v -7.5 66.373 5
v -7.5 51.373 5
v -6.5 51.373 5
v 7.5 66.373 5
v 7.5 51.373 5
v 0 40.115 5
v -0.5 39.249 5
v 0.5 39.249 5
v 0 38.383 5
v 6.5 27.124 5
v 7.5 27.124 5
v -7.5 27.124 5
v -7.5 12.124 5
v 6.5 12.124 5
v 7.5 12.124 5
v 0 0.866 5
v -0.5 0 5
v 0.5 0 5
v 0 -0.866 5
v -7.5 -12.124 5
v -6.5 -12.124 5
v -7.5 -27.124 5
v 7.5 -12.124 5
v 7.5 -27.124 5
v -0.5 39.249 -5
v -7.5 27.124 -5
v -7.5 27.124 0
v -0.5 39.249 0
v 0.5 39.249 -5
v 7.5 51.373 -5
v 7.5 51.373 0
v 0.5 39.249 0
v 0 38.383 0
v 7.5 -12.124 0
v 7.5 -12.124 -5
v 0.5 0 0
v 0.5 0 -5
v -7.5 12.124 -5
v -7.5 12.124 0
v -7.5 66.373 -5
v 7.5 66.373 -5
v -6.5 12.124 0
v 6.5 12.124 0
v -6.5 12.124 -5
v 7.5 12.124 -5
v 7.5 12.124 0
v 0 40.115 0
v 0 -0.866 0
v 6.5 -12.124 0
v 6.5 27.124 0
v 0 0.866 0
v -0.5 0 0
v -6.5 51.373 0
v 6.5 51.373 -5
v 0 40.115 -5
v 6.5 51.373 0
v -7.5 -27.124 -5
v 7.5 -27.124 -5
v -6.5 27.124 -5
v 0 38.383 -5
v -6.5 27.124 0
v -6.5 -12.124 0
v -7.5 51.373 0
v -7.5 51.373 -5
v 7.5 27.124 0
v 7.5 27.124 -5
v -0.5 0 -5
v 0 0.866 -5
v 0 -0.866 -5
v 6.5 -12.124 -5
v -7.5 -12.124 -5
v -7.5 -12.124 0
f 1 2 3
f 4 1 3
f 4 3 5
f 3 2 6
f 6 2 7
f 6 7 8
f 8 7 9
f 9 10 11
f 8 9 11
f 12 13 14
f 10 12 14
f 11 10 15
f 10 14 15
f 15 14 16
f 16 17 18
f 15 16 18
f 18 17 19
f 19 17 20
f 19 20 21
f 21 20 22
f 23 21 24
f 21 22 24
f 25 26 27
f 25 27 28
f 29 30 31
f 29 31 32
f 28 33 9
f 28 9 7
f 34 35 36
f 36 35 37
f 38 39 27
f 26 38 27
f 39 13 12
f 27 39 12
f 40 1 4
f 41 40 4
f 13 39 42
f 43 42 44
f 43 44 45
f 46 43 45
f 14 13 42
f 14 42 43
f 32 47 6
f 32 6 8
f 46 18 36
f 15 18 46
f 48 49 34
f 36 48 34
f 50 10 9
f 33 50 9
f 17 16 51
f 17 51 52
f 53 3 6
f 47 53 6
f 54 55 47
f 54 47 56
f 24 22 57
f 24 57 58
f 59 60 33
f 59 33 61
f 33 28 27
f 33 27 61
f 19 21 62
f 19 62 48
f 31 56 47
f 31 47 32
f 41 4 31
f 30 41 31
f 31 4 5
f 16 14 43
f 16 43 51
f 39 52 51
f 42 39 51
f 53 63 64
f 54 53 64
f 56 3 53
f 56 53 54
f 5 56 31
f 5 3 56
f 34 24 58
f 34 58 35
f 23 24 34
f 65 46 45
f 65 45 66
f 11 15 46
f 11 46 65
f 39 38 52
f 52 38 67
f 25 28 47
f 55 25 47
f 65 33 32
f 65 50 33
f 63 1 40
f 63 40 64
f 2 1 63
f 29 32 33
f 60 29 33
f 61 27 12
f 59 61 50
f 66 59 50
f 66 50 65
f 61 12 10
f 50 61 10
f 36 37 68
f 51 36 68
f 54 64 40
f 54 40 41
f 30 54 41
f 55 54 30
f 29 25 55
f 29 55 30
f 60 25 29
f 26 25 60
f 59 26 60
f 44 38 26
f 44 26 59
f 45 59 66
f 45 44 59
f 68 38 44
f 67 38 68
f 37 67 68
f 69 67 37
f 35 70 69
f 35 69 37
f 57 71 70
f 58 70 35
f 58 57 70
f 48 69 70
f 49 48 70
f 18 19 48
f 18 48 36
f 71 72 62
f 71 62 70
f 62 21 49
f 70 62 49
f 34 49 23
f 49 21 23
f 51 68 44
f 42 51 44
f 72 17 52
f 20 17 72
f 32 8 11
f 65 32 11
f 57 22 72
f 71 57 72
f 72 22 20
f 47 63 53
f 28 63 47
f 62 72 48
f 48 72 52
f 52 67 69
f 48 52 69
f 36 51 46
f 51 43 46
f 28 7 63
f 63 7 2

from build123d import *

# Parameters (mm, degrees)
SKETCH1_W           = 15
SKETCH1_H           = 15
BOSS_EXTRUDE1_DEPTH = 5
BOSS_EXTRUDE2_START = 5
BOSS_EXTRUDE2_DEPTH = 5
BOSS_EXTRUDE3_START = -5
BOSS_EXTRUDE3_DEPTH = 5
SKETCH1_5_W         = 15
SKETCH1_5_H         = 15
BOSS_EXTRUDE4_DEPTH = 5


with BuildPart() as part:
    # Sketch1 → Boss-Extrude1 (new, symmetric)
    with BuildSketch(Plane.XY):
        with Locations((0, -19.624355653)):
            Rectangle(SKETCH1_W, SKETCH1_H)
    boss_extrude1 = extrude(amount=BOSS_EXTRUDE1_DEPTH, both=True)

    # Sketch1<3> → Boss-Extrude2 (add)
    with BuildSketch(Plane.XY.offset(BOSS_EXTRUDE2_START)):
        Polygon((-6.5, -12.124355653), (0, -0.866025404), (-0.5, 0), (-7.5, -12.124355653), align=None)
        Polygon((0.5, 0), (7.5, 12.124355653), (6.5, 12.124355653), (0, 0.866025404), align=None)
        Polygon((0, -0.866025404), (0.5, 0), (0, 0.866025404), (-0.5, 0), align=None)
    boss_extrude2 = extrude(amount=-BOSS_EXTRUDE2_DEPTH)

    # Sketch1<4> → Boss-Extrude3 (add)
    with BuildSketch(Plane.XY.offset(BOSS_EXTRUDE3_START)):
        Polygon((0, 0.866025404), (-6.5, 12.124355653), (-7.5, 12.124355653), (-0.5, 0), align=None)
        Polygon((7.5, -12.124355653), (0.5, 0), (0, -0.866025404), (6.5, -12.124355653), align=None)
        Polygon((0, -0.866025404), (0.5, 0), (0, 0.866025404), (-0.5, 0), align=None)
    boss_extrude3 = extrude(amount=BOSS_EXTRUDE3_DEPTH)

    # Sketch1<5> → Boss-Extrude4 (add, symmetric)
    with BuildSketch(Plane.XY):
        with Locations((0, 19.624355653)):
            Rectangle(SKETCH1_5_W, SKETCH1_5_H)
    extrude(amount=BOSS_EXTRUDE4_DEPTH, both=True)

    # Mirror2: Boss-Extrude2, Boss-Extrude3 across plane
    add(boss_extrude2.mirror(Plane(origin=(0, 19.624355653, 0), x_dir=(0, 0, 1), z_dir=(0, -1, 0))))
    add(boss_extrude3.mirror(Plane(origin=(0, 19.624355653, 0), x_dir=(0, 0, 1), z_dir=(0, -1, 0))))

    # Mirror3: Boss-Extrude1 across plane
    add(boss_extrude1.mirror(Plane(origin=(0, 19.624355653, 0), x_dir=(0, 0, 1), z_dir=(0, -1, 0))))


solid = part.part
